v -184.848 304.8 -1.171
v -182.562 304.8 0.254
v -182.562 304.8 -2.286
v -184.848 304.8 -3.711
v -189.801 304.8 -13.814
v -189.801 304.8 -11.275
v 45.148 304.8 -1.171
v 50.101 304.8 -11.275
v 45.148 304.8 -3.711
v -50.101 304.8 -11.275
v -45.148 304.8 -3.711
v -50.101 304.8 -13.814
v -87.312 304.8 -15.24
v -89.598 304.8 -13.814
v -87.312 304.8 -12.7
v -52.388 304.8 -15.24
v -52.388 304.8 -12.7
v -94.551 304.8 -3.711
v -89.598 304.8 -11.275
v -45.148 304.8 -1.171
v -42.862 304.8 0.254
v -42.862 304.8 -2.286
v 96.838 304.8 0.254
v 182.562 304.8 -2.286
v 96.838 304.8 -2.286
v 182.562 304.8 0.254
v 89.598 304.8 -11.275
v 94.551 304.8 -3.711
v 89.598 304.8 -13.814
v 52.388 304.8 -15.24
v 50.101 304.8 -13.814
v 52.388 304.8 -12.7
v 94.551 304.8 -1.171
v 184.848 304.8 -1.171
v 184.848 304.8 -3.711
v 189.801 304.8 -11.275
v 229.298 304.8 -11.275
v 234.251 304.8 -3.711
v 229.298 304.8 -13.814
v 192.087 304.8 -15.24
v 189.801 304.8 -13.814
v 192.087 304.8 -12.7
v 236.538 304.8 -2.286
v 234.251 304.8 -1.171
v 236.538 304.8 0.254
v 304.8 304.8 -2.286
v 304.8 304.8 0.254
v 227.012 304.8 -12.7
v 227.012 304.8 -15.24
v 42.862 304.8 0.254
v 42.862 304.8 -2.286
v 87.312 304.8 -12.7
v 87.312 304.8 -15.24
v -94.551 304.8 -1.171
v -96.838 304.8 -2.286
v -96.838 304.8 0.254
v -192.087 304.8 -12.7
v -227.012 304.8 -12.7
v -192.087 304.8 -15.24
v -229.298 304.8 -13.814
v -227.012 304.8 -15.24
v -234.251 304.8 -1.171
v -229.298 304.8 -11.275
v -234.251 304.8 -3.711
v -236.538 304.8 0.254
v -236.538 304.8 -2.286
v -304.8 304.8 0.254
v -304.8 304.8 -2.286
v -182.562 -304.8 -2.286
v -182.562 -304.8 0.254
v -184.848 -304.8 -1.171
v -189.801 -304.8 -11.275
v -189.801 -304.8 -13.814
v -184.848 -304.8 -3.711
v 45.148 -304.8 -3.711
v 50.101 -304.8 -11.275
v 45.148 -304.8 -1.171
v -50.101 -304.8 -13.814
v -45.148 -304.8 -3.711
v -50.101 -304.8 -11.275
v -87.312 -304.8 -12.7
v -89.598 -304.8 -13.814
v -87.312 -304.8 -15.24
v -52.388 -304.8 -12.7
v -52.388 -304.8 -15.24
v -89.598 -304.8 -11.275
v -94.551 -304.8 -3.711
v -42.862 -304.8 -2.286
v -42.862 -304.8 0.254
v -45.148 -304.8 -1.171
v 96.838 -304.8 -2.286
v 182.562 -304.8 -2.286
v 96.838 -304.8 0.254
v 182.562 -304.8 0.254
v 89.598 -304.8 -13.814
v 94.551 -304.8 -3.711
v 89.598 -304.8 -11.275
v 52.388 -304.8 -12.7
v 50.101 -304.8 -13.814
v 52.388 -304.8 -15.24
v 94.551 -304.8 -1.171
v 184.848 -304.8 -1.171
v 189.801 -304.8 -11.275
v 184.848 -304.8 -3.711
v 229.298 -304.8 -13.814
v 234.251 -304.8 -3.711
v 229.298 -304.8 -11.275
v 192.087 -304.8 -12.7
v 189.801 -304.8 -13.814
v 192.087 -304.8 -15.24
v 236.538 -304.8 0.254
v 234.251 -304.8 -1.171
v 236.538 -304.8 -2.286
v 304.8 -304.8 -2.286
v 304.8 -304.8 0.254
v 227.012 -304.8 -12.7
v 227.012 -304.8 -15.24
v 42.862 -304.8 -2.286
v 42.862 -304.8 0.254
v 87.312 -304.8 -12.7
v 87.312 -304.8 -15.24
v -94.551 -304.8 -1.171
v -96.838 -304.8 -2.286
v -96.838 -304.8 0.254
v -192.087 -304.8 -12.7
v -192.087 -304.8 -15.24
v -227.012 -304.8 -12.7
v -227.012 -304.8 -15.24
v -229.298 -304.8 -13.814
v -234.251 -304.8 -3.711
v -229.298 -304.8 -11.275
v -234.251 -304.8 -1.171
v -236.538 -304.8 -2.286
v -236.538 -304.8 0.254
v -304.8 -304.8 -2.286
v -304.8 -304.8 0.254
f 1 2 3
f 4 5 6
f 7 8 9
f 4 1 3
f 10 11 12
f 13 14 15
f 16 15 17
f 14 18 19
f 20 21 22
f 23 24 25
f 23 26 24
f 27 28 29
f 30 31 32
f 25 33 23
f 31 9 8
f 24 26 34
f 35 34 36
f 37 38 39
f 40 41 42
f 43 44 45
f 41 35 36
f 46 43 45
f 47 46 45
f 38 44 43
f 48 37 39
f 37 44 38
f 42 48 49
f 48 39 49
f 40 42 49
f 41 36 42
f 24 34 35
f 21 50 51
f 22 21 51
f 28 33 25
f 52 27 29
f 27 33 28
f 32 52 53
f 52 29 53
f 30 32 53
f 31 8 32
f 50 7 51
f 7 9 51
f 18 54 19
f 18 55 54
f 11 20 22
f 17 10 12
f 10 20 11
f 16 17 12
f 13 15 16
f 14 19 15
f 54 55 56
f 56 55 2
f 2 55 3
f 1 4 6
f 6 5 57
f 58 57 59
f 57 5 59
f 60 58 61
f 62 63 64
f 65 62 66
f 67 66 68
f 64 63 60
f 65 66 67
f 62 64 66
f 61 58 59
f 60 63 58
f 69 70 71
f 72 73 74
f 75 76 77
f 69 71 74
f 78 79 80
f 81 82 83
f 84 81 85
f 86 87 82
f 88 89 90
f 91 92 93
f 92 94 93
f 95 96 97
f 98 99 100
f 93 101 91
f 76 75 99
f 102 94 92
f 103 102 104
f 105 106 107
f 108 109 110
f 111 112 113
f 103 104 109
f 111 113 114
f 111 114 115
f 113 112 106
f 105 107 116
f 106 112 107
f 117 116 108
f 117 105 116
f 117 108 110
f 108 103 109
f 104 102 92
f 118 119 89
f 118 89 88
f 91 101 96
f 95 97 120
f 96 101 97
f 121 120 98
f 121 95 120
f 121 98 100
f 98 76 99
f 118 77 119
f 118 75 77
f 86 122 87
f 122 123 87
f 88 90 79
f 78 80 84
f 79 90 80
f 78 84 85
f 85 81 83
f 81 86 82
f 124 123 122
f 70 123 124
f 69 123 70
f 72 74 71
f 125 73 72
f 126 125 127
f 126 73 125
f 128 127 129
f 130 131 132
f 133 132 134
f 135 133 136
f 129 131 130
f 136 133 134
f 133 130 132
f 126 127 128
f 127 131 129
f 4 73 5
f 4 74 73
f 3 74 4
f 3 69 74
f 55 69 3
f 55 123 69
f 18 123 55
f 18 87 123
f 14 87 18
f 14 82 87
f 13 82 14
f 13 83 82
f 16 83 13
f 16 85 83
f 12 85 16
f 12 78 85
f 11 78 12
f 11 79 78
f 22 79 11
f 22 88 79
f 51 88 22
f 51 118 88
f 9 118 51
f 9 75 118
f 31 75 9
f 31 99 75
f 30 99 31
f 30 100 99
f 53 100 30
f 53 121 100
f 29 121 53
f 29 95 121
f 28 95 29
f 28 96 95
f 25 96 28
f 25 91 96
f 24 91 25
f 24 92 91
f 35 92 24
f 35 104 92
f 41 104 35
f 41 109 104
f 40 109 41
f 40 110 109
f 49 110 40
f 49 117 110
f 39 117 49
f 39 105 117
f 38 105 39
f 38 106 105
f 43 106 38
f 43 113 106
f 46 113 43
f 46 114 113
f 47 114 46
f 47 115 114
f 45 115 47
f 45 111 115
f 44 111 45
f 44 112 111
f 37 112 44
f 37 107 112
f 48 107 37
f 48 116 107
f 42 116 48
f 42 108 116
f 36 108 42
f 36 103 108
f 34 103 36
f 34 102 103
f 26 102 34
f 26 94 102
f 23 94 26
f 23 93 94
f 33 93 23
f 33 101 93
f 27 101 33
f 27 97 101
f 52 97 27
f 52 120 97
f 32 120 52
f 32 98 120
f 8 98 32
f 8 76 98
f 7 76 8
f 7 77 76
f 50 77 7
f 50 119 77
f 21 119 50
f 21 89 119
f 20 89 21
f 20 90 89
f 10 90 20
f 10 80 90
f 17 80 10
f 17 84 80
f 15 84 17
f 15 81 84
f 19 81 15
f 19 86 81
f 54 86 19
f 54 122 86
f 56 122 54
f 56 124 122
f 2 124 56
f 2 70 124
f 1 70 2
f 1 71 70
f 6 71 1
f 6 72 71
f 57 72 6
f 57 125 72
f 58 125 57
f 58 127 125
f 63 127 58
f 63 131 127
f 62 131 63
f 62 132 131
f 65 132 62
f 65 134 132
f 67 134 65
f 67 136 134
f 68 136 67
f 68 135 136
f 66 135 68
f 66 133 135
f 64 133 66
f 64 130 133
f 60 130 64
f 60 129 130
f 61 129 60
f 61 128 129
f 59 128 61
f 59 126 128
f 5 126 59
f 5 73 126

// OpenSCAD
// =============================================================================
// trapezoidal_roof_preview.scad
//
// Visual sanity check for trapezoidal_roof.scad. Renders a manageable chunk
// of the roof as a thin sheet-metal-like panel so the STL reads like a real
// stamped roof rather than a solid block.
//
// The volumetric `trapezoidal_roof_cutter` used by circular_adapter.scad
// stays unchanged; this file only calls `trapezoidal_roof_sheet`.
// =============================================================================

include <trapezoidal_roof.scad>

$fn = 240;

// -----------------------------------------------------------------------------
// Preview extents (inches).  Big enough to show at least three ribs and two
// indents on each side of the preview center.  Sheet thickness is bumped up
// from the real ~0.032" gauge to 0.100" purely so it reads clearly as an STL.
// -----------------------------------------------------------------------------
preview_xy      = 12;
sheet_thickness = 0.100;

flange_offset_x = 0;                        // 0 = rib-centered; indent_center_x = indent-centered

IN2MM = 25.4;

scale([IN2MM, IN2MM, IN2MM])
    trapezoidal_roof_sheet(
        flange_offset_x    = flange_offset_x,
        cut_xy          = preview_xy,
        sheet_thickness = sheet_thickness
    );
